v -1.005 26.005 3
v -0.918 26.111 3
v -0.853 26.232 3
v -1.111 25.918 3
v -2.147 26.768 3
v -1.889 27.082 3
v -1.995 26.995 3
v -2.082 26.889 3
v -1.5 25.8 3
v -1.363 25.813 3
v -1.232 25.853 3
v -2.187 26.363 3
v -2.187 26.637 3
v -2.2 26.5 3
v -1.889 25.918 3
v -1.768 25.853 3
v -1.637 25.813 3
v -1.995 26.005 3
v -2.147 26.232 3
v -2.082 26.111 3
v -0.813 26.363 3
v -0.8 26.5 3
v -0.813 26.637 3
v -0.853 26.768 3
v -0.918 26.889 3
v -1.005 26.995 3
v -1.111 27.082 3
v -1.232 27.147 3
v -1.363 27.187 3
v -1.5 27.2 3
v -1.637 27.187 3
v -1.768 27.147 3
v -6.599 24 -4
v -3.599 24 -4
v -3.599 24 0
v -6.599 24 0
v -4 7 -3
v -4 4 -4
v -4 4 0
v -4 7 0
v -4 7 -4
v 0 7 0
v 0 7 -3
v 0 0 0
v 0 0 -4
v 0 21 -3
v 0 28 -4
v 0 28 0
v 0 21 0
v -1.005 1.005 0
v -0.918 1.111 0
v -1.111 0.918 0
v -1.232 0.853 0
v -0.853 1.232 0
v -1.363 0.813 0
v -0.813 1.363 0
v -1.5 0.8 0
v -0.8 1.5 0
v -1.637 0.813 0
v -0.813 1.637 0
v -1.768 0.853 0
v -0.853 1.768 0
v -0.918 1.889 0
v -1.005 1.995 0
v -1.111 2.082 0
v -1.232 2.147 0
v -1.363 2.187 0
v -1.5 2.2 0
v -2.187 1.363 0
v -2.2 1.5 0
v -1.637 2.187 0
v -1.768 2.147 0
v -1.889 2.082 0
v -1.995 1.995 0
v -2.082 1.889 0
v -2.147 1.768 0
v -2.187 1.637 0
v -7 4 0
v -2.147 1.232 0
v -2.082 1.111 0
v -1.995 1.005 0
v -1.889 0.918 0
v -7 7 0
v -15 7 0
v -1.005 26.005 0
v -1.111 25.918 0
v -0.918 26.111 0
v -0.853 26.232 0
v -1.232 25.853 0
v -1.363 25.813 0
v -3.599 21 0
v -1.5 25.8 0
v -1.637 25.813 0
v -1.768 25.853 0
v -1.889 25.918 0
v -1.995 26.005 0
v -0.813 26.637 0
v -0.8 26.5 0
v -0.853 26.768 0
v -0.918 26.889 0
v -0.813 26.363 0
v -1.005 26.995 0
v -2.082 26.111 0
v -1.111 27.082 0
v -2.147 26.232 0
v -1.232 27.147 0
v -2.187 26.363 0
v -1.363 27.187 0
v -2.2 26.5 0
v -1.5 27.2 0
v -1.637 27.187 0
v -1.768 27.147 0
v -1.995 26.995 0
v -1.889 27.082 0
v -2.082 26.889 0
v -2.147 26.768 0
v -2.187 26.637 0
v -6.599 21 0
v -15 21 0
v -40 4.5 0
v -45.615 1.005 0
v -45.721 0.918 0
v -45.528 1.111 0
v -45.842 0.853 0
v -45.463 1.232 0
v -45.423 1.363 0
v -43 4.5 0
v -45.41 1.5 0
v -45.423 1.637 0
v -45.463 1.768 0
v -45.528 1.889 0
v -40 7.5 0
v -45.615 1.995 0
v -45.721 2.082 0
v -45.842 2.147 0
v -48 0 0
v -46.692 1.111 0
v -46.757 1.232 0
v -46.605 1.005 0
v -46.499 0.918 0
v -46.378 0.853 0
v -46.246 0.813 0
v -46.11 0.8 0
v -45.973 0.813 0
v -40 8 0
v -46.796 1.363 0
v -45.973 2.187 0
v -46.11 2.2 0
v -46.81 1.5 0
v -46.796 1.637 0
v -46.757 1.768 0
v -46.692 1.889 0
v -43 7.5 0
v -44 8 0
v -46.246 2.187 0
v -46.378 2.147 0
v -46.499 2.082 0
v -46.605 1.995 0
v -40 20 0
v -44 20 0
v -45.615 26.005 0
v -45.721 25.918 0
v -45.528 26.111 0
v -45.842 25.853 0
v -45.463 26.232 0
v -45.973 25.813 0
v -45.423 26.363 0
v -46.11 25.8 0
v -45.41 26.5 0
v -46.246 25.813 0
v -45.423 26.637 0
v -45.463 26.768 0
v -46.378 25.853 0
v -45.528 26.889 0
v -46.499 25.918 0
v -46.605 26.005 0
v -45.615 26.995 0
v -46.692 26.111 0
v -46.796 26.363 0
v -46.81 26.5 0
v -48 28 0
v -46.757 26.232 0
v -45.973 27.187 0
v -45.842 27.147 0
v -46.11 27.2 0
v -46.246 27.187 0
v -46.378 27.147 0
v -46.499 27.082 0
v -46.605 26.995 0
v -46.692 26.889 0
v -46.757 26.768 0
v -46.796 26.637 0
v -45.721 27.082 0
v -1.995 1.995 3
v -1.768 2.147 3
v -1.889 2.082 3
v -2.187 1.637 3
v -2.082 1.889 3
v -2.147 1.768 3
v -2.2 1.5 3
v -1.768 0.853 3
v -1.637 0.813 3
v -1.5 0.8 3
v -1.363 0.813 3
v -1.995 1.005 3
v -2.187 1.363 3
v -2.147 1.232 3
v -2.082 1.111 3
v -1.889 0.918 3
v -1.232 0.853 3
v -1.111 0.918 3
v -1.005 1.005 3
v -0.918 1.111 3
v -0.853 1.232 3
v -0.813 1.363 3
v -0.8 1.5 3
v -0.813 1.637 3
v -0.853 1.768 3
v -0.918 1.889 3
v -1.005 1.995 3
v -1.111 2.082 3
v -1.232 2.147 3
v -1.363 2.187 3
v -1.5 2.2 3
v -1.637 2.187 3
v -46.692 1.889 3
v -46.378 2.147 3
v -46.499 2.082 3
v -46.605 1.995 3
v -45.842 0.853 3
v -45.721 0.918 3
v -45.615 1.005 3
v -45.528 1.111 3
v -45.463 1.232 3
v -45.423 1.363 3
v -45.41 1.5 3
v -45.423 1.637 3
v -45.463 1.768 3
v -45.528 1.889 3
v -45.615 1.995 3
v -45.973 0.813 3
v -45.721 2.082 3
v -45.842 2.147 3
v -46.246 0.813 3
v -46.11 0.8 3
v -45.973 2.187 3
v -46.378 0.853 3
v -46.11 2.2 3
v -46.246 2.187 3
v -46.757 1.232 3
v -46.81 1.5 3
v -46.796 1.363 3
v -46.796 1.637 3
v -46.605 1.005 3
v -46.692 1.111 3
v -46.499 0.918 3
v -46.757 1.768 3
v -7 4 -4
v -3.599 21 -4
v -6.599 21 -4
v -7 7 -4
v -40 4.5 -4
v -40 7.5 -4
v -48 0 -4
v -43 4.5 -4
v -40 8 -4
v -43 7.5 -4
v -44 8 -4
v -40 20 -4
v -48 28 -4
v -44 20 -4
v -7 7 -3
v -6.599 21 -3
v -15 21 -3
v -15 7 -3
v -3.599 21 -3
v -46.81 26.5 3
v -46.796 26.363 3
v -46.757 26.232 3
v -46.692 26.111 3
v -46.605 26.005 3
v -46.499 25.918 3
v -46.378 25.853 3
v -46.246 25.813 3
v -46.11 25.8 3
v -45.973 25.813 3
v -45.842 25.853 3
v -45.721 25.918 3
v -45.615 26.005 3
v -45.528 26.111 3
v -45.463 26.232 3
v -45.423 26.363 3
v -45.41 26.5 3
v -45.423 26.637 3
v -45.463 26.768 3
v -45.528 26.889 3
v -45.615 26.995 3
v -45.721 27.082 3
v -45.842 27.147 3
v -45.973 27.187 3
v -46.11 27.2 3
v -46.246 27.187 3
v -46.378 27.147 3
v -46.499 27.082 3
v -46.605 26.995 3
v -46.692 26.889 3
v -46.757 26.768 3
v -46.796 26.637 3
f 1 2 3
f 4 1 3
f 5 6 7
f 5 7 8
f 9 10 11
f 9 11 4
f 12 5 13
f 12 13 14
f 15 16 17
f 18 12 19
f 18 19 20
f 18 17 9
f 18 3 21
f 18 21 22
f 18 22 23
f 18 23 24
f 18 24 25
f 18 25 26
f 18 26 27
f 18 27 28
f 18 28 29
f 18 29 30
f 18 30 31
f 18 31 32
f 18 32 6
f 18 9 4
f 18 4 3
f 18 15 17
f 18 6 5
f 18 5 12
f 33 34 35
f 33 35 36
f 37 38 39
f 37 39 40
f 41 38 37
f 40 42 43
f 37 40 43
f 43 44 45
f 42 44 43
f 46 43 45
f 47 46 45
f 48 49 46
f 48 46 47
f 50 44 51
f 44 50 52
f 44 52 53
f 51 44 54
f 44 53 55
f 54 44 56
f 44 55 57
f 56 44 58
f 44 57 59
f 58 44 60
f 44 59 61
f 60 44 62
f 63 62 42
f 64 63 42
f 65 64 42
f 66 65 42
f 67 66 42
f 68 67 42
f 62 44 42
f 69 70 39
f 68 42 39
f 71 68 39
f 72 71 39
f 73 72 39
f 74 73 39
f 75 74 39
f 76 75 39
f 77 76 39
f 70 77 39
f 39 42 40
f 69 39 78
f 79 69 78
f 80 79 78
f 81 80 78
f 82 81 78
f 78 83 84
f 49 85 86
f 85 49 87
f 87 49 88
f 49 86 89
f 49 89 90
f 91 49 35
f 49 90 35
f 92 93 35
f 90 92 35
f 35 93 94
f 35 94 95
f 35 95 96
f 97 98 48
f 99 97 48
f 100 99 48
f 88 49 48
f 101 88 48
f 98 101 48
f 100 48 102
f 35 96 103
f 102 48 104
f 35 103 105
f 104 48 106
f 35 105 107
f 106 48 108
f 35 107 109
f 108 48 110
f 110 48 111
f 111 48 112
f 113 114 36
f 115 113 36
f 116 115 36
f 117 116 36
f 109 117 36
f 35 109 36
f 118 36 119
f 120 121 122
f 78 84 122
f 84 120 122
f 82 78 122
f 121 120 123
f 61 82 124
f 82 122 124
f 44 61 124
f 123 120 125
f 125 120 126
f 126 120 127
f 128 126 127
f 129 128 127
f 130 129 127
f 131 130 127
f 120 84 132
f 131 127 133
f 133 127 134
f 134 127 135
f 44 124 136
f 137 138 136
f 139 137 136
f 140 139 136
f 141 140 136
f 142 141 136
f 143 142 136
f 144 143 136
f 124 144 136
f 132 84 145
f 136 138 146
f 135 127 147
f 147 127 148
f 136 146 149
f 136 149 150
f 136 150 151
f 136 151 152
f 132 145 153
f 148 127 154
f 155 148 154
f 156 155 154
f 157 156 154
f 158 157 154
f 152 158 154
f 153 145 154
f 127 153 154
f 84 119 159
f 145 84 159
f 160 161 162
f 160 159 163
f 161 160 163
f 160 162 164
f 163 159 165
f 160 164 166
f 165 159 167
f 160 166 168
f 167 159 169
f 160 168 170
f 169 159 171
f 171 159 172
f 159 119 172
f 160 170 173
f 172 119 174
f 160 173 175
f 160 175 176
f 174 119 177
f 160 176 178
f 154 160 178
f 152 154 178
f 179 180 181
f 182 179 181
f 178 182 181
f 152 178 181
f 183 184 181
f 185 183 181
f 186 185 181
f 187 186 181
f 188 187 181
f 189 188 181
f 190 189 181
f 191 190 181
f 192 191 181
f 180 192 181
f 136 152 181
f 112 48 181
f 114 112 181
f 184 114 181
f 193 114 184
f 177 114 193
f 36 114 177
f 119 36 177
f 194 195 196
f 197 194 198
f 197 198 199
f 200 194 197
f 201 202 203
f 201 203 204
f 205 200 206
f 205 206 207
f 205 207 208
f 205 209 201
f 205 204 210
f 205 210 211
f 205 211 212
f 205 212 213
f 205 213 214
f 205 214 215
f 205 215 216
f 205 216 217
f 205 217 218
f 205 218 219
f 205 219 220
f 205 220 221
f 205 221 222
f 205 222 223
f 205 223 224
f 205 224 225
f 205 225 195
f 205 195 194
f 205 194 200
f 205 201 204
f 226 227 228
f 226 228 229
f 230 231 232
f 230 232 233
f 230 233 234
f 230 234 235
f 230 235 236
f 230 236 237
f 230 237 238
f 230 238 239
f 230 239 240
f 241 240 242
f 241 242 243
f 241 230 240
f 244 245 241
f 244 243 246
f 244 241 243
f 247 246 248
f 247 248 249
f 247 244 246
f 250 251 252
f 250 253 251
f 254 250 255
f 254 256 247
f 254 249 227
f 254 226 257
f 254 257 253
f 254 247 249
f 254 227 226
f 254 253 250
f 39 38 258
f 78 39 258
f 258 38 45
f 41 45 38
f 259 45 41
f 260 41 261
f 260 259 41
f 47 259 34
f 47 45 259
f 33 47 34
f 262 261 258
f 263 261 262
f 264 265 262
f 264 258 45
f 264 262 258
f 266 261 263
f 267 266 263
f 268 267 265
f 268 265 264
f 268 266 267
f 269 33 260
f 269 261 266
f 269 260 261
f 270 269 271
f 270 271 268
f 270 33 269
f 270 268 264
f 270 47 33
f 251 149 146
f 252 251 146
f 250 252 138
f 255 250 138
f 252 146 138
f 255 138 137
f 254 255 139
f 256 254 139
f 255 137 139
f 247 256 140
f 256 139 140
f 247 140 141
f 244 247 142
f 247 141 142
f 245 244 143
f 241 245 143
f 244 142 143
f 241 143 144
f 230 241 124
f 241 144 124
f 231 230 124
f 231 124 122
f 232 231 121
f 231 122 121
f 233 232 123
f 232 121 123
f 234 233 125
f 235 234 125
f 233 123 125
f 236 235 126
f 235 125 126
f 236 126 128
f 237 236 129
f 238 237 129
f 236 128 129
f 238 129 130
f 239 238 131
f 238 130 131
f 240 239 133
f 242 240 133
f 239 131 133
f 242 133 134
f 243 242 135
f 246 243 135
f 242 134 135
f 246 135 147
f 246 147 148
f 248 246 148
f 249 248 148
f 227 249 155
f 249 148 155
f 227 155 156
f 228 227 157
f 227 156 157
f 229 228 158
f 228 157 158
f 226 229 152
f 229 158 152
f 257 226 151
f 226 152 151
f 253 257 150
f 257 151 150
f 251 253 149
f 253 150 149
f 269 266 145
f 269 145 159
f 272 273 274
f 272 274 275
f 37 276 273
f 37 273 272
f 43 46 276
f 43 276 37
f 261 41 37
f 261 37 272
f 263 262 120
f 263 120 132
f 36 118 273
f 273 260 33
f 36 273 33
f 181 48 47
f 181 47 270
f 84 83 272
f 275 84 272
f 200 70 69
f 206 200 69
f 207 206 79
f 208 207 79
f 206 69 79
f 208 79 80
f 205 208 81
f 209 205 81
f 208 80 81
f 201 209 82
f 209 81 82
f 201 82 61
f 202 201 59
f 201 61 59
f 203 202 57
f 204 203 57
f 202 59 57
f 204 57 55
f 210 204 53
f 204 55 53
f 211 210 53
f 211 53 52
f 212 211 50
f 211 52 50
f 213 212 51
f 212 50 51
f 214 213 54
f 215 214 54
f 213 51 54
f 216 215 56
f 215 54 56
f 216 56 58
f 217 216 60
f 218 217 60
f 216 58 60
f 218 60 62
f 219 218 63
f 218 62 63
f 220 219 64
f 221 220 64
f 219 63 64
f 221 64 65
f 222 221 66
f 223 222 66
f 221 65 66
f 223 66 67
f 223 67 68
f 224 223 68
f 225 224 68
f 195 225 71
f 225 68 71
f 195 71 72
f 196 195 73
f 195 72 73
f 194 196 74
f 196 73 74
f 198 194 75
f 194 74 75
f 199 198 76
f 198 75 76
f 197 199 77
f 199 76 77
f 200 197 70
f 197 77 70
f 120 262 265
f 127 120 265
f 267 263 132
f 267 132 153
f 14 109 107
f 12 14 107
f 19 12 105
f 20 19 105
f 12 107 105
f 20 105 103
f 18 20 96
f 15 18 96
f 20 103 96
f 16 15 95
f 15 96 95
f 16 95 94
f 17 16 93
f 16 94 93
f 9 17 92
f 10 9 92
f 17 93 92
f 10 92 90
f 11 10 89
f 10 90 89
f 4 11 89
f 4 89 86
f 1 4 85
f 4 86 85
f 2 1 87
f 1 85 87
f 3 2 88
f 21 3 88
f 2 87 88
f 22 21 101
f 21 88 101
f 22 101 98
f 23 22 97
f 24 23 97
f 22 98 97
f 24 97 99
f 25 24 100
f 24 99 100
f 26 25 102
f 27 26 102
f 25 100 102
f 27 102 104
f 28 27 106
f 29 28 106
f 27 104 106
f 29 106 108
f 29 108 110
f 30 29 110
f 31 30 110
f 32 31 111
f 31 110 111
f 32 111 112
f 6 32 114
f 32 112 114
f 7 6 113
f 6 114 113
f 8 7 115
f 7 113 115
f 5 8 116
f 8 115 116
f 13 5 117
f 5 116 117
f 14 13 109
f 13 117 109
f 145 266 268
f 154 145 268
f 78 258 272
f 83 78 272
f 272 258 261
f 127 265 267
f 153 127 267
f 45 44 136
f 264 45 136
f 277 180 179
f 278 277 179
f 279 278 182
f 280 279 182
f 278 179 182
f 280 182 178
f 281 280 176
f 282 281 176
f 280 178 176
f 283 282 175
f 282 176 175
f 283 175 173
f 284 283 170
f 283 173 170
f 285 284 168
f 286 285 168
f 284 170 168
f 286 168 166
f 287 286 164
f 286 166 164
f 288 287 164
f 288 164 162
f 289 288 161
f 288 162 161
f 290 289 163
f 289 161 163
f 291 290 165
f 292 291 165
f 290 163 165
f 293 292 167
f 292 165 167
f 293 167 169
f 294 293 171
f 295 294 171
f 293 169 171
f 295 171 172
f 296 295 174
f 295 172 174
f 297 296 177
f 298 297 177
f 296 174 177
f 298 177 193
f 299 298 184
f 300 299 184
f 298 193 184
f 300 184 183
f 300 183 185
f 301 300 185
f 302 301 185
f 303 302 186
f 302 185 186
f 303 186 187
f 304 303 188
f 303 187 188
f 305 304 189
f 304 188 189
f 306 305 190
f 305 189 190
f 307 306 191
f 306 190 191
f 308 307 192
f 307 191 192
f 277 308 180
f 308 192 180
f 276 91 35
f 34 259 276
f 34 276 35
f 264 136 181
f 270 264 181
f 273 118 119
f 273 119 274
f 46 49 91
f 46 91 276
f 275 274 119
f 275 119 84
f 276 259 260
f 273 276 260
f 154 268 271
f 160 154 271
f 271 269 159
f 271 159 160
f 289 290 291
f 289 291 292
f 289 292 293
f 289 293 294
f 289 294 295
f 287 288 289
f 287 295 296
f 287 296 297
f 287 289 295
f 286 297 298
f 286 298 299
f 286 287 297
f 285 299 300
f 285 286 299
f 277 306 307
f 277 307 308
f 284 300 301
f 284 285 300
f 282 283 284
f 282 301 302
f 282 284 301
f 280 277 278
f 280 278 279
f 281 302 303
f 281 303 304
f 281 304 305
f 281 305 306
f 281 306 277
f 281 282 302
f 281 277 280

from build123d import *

# Parameters (mm, degrees)
SKETCH_W               = 48
SKETCH_H               = 28
PAD_DEPTH              = 4
SKETCH001_W            = 14
SKETCH001_H            = 3
POCKET_DEPTH           = 15
SKETCH002_W            = 4
SKETCH002_H            = 12
SKETCH002_W_2          = 3
SKETCH002_H_2          = 3
POCKET001_DEPTH        = 4.001
SKETCH003_R            = 0.7
PAD001_DEPTH           = 3
FUSION_PLACEMENT_ANGLE = 180


with BuildPart() as pocket001:
    # Sketch → Pad (new body)
    with BuildSketch(Plane.XY):
        with Locations((24, 14)):
            Rectangle(SKETCH_W, SKETCH_H)
    extrude(amount=PAD_DEPTH)

    # Sketch001 → Pocket (cut)
    with BuildSketch(Plane(origin=(0, 0, 0), x_dir=(0, -1, 0), z_dir=(-1, 0, 0))):
        with Locations((-14, 1.5)):
            Rectangle(SKETCH001_W, SKETCH001_H)
    extrude(amount=-POCKET_DEPTH, mode=Mode.SUBTRACT)

    # Sketch002 → Pocket001 (cut, through all)
    with BuildSketch(Plane.XY.offset(4)):
        with Locations((42, 14)):
            Rectangle(SKETCH002_W, SKETCH002_H)
        with Locations((41.5, 6)):
            Rectangle(SKETCH002_W_2, SKETCH002_H_2)
        with Locations((5.5, 5.5)):
            Rectangle(SKETCH002_W_2, SKETCH002_H_2)
        with Locations((5.098741, 22.5)):
            Rectangle(SKETCH002_W_2, SKETCH002_H_2)
    extrude(amount=-POCKET001_DEPTH, mode=Mode.SUBTRACT)


with BuildPart() as fusion:
    # Pad001 base: copy of Pocket001
    add(pocket001.part)

    # Sketch003 → Pad001 (new body)
    with BuildSketch(Plane(origin=(0, 0, 0), x_dir=(1, 0, 0), z_dir=(0, 0, -1))):
        with Locations((1.5, -1.5)):
            Circle(SKETCH003_R)
        with Locations((1.5, -26.5)):
            Circle(SKETCH003_R)
        with Locations((46.109886, -26.5)):
            Circle(SKETCH003_R)
        with Locations((46.109886, -1.5)):
            Circle(SKETCH003_R)
    extrude(amount=PAD001_DEPTH)

    # Fusion: union Pocket001
    add(pocket001.part)


with BuildPart() as fusion_1:
    # Fusion placement: moved
    add(fusion.part.rotate(Axis((0, 0, 0), (0, 1, 0)), FUSION_PLACEMENT_ANGLE))


solid = fusion_1.part
